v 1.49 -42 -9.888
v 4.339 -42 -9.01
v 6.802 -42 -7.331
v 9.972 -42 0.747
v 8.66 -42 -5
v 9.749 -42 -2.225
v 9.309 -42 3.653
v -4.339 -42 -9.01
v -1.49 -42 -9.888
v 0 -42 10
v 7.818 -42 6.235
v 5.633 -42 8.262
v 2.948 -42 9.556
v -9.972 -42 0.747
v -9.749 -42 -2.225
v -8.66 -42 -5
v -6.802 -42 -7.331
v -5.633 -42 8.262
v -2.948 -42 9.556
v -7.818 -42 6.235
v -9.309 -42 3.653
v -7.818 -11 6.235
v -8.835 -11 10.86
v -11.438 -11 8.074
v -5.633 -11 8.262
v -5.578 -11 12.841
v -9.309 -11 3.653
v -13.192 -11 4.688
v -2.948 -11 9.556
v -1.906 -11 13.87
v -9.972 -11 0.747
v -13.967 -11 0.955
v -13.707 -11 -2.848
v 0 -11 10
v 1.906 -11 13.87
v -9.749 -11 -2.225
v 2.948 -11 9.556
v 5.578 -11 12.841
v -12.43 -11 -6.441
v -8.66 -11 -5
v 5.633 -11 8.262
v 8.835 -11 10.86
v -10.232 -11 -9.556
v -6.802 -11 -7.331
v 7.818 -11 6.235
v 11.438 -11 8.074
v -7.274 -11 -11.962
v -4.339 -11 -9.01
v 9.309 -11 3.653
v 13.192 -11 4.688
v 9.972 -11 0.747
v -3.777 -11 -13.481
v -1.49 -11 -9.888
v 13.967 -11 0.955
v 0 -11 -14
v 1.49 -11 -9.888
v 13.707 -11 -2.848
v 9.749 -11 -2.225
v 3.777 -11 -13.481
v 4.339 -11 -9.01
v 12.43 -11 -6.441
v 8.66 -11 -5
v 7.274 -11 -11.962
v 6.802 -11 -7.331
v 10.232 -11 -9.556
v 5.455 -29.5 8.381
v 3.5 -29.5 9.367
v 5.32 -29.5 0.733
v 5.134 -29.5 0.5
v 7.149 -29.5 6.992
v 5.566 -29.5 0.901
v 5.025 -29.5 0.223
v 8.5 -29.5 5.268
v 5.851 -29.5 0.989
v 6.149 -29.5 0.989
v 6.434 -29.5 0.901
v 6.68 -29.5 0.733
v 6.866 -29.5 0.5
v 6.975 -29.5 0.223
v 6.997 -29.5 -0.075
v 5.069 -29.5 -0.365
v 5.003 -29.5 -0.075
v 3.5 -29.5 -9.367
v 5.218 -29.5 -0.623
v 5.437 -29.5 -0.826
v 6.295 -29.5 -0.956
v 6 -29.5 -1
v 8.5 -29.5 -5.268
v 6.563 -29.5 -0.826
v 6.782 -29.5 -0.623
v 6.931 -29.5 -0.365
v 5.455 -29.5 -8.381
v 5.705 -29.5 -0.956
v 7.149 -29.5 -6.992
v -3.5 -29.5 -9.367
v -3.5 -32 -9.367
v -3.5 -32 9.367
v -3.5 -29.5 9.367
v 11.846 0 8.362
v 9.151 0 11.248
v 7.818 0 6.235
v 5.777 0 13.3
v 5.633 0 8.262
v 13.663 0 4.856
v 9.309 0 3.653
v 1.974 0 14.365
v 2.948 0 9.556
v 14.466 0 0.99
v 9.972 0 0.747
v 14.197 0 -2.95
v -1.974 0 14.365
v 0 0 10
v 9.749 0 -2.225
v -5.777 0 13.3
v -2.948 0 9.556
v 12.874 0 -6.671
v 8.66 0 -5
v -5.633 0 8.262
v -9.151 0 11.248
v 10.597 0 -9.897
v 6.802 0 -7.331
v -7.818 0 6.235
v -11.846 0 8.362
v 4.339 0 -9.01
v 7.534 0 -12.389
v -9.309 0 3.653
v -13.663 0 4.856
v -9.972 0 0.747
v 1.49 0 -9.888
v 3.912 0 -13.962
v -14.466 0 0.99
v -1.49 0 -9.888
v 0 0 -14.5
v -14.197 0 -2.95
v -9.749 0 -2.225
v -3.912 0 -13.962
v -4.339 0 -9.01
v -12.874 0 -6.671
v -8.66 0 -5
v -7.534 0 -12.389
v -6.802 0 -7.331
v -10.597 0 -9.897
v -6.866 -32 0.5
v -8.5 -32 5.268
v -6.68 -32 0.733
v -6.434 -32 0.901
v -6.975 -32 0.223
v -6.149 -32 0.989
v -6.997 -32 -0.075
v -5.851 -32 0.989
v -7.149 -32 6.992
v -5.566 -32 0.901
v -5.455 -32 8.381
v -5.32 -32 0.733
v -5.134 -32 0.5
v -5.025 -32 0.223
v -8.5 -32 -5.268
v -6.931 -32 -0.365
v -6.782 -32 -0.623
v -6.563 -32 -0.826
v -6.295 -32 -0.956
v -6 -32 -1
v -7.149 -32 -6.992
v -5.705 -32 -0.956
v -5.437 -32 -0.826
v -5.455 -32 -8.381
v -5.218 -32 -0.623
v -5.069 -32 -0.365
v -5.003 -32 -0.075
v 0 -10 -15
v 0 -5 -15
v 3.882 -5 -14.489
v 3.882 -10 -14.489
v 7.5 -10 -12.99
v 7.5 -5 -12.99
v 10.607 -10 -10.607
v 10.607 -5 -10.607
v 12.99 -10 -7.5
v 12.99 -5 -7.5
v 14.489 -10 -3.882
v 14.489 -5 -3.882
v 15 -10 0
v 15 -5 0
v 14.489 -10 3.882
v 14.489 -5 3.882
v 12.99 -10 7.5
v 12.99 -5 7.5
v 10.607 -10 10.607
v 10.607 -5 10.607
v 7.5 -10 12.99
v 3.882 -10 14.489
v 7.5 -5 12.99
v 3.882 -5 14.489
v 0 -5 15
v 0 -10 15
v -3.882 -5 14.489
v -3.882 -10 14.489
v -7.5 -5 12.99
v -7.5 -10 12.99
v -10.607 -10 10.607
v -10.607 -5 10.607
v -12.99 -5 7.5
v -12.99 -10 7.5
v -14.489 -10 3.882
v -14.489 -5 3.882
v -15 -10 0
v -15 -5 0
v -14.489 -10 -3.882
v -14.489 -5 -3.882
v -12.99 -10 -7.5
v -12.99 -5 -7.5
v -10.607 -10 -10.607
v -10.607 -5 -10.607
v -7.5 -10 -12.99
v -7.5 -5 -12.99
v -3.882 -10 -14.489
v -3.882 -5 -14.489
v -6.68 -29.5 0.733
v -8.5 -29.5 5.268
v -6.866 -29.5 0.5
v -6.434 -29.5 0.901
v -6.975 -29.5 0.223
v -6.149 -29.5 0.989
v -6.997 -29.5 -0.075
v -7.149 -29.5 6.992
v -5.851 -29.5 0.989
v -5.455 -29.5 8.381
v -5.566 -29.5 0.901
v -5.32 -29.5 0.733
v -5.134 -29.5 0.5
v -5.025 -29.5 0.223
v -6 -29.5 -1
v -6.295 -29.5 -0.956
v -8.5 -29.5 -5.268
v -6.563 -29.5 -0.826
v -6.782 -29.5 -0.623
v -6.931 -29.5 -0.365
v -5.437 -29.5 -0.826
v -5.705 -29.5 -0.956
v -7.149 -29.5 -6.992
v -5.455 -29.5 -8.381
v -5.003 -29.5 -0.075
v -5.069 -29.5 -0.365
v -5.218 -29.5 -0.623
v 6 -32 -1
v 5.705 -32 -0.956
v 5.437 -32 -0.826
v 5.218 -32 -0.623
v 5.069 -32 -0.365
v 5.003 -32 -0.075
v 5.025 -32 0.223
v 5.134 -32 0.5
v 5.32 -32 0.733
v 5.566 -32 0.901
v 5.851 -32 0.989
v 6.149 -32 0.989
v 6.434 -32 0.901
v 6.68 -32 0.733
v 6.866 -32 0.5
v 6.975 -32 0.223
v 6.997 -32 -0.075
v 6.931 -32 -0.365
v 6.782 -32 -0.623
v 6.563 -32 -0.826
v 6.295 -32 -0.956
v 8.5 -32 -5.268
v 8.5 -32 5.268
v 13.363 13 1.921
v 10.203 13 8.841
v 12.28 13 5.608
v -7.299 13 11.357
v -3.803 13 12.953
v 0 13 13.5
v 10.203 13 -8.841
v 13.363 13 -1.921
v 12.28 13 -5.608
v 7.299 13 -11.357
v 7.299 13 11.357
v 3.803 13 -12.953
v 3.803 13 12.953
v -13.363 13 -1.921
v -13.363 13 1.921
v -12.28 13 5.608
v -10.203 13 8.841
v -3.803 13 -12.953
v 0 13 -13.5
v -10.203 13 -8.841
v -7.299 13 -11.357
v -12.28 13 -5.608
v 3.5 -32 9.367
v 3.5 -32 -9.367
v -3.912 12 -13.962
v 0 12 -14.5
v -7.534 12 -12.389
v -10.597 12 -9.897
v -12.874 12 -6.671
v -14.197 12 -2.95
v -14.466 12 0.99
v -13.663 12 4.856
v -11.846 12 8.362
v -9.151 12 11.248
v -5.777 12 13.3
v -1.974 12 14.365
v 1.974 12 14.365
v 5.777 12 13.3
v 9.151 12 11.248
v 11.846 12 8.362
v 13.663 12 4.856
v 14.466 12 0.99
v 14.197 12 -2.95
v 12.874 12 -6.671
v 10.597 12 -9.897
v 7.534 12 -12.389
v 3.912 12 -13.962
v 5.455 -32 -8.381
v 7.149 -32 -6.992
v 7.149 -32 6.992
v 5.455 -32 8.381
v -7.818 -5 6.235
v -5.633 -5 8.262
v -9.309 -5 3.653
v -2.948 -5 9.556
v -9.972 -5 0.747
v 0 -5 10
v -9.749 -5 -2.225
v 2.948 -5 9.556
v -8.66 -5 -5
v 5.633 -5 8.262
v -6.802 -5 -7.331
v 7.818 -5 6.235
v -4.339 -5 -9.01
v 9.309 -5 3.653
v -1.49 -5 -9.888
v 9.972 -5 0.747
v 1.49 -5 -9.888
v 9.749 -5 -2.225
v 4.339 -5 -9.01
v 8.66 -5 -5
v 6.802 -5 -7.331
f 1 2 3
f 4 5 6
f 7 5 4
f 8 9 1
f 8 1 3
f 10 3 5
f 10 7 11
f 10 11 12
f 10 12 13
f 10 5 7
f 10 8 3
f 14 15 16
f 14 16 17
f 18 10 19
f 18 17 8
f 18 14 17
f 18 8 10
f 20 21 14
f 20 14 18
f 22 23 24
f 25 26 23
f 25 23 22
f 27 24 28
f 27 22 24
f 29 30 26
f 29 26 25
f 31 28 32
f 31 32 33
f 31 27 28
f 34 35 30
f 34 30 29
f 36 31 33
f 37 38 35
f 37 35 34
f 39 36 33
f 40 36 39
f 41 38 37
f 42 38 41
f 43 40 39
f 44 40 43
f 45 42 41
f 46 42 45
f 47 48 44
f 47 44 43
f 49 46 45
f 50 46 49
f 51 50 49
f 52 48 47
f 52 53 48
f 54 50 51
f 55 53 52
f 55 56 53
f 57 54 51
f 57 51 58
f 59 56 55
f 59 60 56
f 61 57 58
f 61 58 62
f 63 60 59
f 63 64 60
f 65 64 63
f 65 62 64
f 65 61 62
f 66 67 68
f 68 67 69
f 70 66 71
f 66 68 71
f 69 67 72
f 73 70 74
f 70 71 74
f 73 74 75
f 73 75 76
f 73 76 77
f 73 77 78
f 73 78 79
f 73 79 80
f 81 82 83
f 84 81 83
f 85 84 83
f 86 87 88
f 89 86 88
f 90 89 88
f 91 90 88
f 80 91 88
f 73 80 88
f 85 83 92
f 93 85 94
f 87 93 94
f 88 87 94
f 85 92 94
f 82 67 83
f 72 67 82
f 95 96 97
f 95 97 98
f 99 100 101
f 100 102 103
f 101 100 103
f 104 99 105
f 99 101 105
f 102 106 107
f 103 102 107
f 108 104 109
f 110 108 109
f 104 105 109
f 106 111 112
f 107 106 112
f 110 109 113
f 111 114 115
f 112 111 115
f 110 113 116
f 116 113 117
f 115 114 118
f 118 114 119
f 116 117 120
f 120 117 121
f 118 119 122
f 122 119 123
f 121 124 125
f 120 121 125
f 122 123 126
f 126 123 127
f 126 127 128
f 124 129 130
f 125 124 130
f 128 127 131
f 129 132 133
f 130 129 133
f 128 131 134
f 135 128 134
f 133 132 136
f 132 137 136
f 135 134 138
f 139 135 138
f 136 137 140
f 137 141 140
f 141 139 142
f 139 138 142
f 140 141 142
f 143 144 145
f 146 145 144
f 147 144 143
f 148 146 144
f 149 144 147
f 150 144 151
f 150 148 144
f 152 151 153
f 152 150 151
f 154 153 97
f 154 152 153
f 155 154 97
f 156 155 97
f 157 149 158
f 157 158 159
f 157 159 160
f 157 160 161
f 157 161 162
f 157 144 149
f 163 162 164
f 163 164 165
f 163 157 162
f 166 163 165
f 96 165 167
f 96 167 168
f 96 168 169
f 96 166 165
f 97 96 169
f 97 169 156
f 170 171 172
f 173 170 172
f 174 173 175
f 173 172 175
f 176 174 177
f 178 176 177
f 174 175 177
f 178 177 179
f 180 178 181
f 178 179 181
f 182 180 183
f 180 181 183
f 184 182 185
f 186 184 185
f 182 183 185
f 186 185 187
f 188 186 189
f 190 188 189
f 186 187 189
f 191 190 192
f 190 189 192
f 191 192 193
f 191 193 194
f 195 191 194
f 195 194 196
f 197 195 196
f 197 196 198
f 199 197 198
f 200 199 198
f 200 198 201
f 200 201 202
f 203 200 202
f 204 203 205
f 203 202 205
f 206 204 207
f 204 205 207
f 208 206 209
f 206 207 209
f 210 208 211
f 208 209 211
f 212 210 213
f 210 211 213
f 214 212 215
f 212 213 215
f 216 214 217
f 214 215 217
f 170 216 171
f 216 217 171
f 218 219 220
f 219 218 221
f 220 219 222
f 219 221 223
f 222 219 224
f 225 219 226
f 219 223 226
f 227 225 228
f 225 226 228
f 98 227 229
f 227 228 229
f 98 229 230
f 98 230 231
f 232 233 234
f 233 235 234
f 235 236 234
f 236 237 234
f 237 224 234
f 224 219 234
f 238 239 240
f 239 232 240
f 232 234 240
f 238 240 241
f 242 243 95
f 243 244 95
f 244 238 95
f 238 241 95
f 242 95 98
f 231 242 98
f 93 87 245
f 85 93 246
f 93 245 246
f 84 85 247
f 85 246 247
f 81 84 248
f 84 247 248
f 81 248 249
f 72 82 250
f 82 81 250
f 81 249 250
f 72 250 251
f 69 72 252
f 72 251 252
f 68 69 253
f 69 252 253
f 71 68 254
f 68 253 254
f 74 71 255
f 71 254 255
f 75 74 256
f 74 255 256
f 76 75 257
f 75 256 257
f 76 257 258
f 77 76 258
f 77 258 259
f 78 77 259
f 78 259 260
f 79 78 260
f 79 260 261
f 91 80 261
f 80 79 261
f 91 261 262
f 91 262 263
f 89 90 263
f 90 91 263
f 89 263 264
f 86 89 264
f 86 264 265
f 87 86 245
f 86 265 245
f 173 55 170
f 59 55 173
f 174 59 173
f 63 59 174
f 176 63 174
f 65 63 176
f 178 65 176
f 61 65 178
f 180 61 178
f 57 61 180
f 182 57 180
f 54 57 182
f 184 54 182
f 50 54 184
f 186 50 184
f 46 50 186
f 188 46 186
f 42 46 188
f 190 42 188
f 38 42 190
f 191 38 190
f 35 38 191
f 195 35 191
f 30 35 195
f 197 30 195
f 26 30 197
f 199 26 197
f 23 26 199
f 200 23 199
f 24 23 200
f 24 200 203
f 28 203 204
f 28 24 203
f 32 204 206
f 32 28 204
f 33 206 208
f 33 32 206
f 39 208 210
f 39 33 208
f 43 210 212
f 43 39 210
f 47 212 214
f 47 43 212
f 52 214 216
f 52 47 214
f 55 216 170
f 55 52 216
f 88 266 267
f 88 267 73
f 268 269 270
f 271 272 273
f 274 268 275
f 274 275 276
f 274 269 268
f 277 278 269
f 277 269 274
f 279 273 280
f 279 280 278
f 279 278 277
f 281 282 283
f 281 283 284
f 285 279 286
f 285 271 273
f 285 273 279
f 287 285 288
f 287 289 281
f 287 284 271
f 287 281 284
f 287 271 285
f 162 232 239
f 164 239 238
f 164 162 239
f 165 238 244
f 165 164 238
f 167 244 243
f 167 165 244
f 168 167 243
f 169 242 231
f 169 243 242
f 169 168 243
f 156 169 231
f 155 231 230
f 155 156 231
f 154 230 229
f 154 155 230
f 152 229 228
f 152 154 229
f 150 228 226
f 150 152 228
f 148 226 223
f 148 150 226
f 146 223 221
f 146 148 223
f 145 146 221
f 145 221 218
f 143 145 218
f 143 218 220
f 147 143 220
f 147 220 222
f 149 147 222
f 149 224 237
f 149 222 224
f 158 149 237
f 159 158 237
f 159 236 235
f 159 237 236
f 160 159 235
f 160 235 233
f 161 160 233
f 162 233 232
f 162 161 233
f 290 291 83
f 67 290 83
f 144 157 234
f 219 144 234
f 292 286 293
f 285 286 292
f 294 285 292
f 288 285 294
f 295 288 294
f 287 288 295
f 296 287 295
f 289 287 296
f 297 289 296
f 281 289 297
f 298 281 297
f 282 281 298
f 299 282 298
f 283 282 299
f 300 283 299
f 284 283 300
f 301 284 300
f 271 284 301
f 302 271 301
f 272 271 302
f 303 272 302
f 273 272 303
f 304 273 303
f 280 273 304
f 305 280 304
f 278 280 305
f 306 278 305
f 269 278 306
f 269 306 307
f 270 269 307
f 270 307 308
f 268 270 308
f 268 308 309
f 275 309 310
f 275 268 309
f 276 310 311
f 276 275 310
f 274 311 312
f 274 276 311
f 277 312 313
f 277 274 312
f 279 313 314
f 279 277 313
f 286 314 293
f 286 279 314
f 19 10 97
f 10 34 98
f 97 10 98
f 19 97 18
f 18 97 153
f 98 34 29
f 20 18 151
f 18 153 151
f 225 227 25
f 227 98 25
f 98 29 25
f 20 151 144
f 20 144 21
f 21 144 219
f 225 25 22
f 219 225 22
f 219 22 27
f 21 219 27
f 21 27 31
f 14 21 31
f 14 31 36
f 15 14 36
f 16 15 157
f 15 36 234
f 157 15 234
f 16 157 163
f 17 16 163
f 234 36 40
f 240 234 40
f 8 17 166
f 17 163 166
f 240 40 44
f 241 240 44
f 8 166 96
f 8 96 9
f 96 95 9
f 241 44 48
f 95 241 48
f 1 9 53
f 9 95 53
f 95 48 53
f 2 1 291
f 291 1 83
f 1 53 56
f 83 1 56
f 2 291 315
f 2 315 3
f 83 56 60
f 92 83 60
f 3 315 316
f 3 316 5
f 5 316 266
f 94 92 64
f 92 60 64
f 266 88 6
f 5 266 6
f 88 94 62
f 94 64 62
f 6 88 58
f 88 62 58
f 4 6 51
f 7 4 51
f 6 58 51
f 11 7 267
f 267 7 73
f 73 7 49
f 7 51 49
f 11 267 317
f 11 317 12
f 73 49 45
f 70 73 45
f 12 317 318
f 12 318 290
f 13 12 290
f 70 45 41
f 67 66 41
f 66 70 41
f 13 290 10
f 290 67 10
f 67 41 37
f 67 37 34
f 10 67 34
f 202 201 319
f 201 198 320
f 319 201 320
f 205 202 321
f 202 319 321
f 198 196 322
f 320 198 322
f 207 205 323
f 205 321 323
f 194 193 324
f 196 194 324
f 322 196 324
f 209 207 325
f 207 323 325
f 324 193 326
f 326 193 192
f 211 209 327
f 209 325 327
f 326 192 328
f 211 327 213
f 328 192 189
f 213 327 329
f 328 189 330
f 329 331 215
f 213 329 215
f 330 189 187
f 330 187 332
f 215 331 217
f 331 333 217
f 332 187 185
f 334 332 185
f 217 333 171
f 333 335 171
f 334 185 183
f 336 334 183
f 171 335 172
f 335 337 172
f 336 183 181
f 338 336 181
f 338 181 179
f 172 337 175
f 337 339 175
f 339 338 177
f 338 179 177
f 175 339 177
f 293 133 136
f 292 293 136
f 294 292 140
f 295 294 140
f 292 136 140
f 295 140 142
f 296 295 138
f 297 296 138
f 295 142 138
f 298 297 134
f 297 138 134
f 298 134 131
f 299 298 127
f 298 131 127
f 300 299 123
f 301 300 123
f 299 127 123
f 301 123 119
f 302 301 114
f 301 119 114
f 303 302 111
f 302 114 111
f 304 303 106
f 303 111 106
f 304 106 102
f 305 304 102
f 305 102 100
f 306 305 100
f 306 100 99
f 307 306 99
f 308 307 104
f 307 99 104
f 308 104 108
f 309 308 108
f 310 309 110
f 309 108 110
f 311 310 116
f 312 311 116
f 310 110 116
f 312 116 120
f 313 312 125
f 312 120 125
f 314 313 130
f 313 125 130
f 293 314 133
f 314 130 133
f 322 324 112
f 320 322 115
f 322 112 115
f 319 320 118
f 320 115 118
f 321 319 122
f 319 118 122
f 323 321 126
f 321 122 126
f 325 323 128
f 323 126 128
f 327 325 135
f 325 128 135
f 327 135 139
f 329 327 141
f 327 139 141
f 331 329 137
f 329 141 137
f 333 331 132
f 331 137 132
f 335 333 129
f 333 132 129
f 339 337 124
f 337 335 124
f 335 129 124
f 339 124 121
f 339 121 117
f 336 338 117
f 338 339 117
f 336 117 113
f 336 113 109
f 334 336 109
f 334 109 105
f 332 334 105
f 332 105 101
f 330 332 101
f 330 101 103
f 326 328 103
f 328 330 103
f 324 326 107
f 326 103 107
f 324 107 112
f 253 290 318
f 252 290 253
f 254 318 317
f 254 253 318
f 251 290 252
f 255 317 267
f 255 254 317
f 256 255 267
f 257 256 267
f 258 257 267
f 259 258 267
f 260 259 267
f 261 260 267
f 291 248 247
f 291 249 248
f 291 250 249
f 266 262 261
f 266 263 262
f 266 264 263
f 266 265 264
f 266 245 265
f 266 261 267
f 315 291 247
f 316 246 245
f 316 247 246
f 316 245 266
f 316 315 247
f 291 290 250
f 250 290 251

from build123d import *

# Parameters (mm, degrees)
SKETCH_1_R               = 14.5
EXTRUDE_1_DEPTH          = 13
CHAMFER_1_SIZE           = 1
SKETCH_2_R               = 10
EXTRUDE_2_DEPTH          = 42
CUT_EXTRUDE_1_DEPTH      = 47.738634982
CUT_EXTRUDE_1_DEPTH_BACK = 47.738634982
SKETCH_3_W               = 5
SKETCH_3_H               = 2.5
EXTRUDE_3_REACH          = 51.452
SKETCH_5_R               = 1
EXTRUDE_START            = 5
SKETCH_6_R               = 15
EXTRUDE_4_DEPTH          = 6
CHAMFER_3_SIZE           = 1


with BuildPart() as part:
    # Эскиз1 → Бобышка-Вытянуть1 (new body)
    with BuildSketch(Plane(origin=(0, 0, 0), x_dir=(1, 0, 0), z_dir=(0, 1, 0))):
        with Locations(Location((0, 0, 0), (0, 0, 90))):
            Circle(SKETCH_1_R)
    extrude(amount=EXTRUDE_1_DEPTH)

    # Фаска1
    chamfer_1_edges = [part.edges().sort_by_distance(p)[0] for p in [
        (0, 13, 14.5),
    ]]
    chamfer(chamfer_1_edges, length=CHAMFER_1_SIZE)

    # Эскиз2 → Бобышка-Вытянуть2 (add)
    with BuildSketch(Plane.XZ):
        with Locations(Location((0, 0, 0), (0, 0, 90))):
            Circle(SKETCH_2_R)
    extrude(amount=EXTRUDE_2_DEPTH)

    # Эскиз3 → Вырез-Вытянуть1 (cut, two sides: drawn at the far end of the back side and taken through both)
    with BuildSketch(Plane.XY.offset(-CUT_EXTRUDE_1_DEPTH_BACK)):
        with Locations((-6, -30.75)):
            Rectangle(SKETCH_3_W, SKETCH_3_H)
        with Locations((6, -30.75)):
            Rectangle(SKETCH_3_W, SKETCH_3_H)
    extrude(amount=CUT_EXTRUDE_1_DEPTH + CUT_EXTRUDE_1_DEPTH_BACK, mode=Mode.SUBTRACT)

    # Эскиз5 → Бобышка-Вытянуть3 (add, up to next)
    with BuildSketch(Plane(origin=(0, -32, 0), x_dir=(1, 0, 0), z_dir=(0, 1, 0)), mode=Mode.PRIVATE) as extrude_3_sk1:
        with Locations(Location((6, 0, 0), (0, 0, 90))):
            Circle(SKETCH_5_R)
    extrude_3_tool1 = extrude(extrude_3_sk1.sketch, amount=EXTRUDE_3_REACH, mode=Mode.PRIVATE) - part.part
    extrude_3 = extrude_3_tool1.solids().sort_by_distance((6, -32, 0))[0]
    add(extrude_3)

    # Зеркальное отражение1: Бобышка-Вытянуть3 across plane
    add(extrude_3.mirror(Plane(origin=(0, 0, 0), x_dir=(0, 0, 1), z_dir=(1, 0, 0))))

    # Эскиз6 → Бобышка-Вытянуть4 (add)
    with BuildSketch(Plane.XZ.offset(EXTRUDE_START)):
        with Locations(Location((0, 0, 0), (0, 0, 270))):
            Circle(SKETCH_6_R)
    extrude(amount=EXTRUDE_4_DEPTH)

    # Фаска3
    chamfer_3_edges = [part.edges().sort_by_distance(p)[0] for p in [
        (0, -11, 15),
    ]]
    chamfer(chamfer_3_edges, length=CHAMFER_3_SIZE)


solid = part.part
